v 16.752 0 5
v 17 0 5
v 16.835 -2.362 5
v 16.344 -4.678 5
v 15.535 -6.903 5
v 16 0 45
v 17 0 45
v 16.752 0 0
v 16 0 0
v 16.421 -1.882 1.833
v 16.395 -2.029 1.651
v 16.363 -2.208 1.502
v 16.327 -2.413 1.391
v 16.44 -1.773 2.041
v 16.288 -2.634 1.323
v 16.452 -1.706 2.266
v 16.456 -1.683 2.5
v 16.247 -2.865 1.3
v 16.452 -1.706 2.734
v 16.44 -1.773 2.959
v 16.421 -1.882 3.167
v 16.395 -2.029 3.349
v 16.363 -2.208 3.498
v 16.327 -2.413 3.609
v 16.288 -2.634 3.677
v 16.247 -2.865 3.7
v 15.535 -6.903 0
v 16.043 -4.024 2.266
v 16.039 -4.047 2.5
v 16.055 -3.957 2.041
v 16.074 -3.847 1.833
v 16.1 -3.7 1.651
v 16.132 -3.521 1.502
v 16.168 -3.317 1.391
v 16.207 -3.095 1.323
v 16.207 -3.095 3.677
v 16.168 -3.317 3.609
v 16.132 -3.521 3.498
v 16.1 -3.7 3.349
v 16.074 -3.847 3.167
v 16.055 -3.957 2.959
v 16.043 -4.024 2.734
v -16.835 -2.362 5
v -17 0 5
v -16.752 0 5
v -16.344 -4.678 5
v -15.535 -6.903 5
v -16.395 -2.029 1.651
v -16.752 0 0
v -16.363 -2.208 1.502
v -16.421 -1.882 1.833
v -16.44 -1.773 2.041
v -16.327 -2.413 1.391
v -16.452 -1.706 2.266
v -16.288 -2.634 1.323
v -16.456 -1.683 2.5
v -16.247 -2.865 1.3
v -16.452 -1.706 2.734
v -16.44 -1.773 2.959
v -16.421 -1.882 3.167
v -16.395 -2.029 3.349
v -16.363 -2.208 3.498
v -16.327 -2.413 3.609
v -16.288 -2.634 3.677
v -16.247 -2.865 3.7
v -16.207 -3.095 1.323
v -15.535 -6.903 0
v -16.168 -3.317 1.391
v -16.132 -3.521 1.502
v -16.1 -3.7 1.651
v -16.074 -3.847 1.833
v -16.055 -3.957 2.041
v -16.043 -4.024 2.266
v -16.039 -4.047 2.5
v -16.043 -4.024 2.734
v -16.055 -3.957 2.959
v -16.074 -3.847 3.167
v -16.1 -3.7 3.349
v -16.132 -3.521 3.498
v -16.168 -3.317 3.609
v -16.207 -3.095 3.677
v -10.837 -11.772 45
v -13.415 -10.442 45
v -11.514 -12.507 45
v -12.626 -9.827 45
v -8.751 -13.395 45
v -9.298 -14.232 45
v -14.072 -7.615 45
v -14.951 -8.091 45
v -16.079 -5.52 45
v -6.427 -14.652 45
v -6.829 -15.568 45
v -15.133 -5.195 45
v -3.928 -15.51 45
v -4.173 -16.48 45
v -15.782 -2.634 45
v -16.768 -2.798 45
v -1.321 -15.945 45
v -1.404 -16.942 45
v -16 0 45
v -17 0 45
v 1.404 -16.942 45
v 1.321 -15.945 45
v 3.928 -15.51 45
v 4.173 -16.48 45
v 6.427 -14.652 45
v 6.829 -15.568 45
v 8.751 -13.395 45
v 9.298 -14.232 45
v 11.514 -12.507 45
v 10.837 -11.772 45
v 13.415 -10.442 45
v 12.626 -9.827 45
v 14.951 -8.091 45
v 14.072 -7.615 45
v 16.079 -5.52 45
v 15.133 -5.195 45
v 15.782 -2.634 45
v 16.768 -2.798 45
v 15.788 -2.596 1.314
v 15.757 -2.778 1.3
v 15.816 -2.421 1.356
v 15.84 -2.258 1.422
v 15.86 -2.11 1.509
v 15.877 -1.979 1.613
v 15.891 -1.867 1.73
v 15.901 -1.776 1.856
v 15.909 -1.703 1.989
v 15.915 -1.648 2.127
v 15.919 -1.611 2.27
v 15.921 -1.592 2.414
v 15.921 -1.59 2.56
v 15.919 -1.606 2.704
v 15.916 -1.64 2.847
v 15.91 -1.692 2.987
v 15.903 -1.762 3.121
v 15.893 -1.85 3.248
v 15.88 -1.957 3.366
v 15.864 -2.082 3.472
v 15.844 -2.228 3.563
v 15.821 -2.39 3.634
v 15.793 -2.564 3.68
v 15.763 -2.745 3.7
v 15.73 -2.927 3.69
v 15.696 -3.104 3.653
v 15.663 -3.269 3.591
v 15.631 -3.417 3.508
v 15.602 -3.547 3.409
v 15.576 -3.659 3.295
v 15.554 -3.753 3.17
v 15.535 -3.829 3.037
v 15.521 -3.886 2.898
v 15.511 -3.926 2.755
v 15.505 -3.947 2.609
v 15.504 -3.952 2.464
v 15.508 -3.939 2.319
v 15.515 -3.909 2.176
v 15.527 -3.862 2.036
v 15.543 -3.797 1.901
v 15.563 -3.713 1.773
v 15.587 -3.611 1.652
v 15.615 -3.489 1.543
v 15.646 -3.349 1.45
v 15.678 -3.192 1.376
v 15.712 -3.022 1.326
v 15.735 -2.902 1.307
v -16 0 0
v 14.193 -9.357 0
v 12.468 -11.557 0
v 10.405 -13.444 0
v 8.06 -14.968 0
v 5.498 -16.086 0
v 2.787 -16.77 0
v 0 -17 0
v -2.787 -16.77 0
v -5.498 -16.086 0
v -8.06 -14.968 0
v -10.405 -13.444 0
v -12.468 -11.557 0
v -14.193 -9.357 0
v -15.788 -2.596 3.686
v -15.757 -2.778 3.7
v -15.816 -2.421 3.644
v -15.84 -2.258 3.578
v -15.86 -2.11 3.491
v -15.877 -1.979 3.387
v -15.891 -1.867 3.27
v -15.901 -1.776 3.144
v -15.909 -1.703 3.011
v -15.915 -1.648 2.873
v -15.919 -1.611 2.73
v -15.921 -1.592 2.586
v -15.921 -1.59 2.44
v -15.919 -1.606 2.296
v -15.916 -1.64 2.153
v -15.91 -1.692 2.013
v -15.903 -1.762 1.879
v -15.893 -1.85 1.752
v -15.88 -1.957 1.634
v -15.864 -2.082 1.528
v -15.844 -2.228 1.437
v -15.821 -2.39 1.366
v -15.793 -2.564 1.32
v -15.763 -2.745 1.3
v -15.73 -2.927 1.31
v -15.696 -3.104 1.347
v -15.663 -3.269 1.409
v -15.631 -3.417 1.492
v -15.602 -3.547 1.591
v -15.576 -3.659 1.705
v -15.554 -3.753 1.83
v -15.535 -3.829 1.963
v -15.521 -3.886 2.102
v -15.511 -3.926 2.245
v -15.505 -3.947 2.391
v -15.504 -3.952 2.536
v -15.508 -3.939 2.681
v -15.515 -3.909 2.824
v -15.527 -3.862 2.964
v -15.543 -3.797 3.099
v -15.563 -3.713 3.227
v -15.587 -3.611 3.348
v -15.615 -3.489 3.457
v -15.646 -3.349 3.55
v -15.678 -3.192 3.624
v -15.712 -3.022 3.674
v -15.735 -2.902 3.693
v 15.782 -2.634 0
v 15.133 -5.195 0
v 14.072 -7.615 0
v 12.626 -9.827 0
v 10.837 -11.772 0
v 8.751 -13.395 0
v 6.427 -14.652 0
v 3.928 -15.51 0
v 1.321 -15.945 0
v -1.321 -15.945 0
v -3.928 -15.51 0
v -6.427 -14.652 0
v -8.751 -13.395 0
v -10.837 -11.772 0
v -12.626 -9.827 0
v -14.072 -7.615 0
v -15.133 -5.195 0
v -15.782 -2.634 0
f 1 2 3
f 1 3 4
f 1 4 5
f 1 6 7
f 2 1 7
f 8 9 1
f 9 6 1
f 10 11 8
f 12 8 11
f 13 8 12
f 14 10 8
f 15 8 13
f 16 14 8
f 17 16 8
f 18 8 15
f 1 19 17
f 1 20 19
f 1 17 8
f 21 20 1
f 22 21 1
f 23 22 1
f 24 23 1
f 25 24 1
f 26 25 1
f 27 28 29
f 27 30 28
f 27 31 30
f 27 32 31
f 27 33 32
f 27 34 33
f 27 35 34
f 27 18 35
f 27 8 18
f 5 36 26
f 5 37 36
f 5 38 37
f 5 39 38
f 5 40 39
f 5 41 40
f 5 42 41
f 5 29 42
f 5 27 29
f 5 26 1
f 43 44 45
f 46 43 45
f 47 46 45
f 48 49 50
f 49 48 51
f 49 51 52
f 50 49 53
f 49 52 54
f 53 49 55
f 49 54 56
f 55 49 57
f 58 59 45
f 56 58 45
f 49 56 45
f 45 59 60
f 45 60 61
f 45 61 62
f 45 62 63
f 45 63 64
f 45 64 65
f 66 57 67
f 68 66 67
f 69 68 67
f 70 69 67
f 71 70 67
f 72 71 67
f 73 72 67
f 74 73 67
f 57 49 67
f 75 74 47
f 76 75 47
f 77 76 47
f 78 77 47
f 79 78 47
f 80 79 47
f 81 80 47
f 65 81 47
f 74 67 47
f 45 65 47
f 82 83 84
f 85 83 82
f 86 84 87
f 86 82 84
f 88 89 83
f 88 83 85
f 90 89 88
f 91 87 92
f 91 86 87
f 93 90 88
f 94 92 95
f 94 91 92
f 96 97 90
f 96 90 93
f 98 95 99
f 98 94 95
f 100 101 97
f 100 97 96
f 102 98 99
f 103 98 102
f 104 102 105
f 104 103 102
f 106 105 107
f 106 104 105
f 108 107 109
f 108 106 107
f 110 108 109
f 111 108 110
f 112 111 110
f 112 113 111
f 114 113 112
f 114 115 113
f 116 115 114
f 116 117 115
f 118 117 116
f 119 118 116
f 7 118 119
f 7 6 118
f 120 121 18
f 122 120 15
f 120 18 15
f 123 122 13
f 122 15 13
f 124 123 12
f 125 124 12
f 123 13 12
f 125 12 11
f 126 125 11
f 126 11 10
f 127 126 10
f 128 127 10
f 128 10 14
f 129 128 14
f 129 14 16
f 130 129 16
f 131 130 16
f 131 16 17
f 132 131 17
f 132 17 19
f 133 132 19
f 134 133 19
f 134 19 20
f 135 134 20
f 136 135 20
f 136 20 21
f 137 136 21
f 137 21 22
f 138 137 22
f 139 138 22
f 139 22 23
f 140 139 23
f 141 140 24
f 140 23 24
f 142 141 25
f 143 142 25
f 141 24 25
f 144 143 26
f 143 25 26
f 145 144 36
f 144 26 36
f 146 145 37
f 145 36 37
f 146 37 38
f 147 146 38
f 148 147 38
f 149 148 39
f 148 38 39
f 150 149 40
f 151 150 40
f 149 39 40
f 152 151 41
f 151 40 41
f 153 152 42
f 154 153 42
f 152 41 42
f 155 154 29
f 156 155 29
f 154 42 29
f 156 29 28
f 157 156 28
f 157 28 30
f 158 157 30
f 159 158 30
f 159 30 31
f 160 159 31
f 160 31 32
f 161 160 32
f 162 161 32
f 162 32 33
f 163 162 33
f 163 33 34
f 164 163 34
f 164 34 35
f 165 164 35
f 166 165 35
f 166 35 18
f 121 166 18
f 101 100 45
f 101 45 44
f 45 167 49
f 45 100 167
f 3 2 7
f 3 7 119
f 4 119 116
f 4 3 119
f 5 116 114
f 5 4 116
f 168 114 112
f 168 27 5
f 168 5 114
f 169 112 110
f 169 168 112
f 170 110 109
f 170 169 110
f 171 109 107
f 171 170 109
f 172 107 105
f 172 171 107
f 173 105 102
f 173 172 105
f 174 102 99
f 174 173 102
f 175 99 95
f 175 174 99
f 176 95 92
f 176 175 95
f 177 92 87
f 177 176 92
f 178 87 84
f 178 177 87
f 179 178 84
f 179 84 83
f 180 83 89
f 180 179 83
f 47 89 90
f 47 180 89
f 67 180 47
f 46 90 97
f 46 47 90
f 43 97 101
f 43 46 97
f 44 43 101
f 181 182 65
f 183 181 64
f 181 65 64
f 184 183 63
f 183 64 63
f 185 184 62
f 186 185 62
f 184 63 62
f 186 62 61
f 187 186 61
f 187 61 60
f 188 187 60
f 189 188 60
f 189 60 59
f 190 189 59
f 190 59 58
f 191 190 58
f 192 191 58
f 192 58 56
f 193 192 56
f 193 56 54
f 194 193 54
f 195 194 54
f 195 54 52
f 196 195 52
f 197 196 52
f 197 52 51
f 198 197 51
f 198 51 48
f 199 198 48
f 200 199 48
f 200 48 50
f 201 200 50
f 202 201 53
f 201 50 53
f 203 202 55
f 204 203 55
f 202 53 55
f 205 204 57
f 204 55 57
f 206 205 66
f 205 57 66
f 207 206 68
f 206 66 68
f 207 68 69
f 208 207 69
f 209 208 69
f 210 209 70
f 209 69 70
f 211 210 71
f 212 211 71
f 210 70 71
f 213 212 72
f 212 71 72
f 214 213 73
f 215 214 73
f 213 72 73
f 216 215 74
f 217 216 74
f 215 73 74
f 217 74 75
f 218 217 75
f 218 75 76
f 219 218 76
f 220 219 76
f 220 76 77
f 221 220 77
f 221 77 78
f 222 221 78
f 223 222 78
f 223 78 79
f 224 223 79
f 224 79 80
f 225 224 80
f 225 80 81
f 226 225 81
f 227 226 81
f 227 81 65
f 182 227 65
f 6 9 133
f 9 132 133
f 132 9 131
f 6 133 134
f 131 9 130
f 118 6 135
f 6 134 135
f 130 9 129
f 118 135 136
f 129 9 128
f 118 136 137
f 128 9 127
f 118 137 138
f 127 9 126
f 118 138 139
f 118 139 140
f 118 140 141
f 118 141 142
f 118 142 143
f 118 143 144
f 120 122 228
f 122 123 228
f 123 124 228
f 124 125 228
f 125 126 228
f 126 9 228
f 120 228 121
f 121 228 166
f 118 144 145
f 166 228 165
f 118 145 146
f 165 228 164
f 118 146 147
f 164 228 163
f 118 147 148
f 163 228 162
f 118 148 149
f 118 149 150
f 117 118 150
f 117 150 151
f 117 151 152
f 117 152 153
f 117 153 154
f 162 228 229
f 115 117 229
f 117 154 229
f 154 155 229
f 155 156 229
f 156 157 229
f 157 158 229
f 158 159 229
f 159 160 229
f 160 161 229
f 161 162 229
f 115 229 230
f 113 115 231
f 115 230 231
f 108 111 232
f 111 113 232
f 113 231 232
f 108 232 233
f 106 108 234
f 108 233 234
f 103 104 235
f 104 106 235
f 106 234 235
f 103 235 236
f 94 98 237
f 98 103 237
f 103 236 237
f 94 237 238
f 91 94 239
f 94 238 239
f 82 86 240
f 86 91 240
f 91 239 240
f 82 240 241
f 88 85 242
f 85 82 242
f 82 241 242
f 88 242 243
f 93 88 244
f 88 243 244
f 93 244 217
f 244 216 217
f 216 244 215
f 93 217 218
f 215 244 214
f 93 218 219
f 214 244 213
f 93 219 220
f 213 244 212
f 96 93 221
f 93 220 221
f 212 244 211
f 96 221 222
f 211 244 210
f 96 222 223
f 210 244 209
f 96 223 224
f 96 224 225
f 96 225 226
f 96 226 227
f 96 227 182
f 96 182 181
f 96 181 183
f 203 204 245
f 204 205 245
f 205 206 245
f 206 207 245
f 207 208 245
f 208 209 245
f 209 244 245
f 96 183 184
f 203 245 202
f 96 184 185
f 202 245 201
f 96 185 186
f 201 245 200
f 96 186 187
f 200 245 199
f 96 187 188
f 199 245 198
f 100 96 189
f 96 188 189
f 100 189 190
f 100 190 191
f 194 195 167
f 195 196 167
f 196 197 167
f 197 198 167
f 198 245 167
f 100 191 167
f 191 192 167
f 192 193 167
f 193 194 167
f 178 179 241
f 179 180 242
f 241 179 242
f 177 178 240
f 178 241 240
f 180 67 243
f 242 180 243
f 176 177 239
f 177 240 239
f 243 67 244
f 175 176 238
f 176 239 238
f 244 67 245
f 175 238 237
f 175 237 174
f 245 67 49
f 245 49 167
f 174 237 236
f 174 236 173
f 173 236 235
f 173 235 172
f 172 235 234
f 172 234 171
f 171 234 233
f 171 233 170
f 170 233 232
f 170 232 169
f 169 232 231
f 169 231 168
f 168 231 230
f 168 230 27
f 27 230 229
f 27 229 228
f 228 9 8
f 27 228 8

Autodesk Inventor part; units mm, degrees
ref_plane "XZ Plane" through (0, 0, 0) normal (0, 1, 0) x (-1, 0, 0)
sketch "スケッチ1" plane through (0, 0, 0) normal (0, 0, 1) x (1, 0, 0)
  arc A0 (-17, 0) -> (17, 0) centre (0, 0) ccw
  arc A1 (-16, 0) -> (16, 0) centre (0, 0) ccw
  line L0 (-16, 0) -> (-17, 0)
  line L1 (16, 0) -> (17, 0)
  dimension "d0" = 17
  dimension "d66" = 1
extrude "押し出し1" add sketch "スケッチ1" along normal blind 45
ref_plane "作業平面4" through (16.7417, -2.952, 0) normal (0.9848, -0.1736, 0) x (0, 0, 1)
ref_plane "作業平面3" through (0, 0, 0) normal (0.9848, -0.1736, 0) x (0, 0, 1)
ref_plane "作業平面6" through (-16.7417, -2.952, 0) normal (0.9848, 0.1736, 0) x (0, 0, 1)
ref_plane "作業平面5" through (0, 0, 0) normal (0.9848, 0.1736, 0) x (0, 0, 1)
sketch "スケッチ8" plane through (16.7417, -2.952, 0) normal (0.9848, -0.1736, 0) x (0, 0, 1)
  line L0 (0, -5) -> (5, -5)
  line L1 (5, -5) -> (5, 5)
  line L2 (5, 5) -> (0, 5)
  line L3 (0, 5) -> (0, -5)
  line L4 (0, 0) -> (8.4852, 0) construction
  dimension "d38" = 5
  dimension "d39" = 10
extrude "押し出し8" cut sketch "スケッチ8" against normal blind 0.5
sketch "スケッチ9" plane through (-16.7417, -2.952, 0) normal (0.9848, 0.1736, 0) x (0, 0, 1)
  line L0 (0, -5) -> (5, -5)
  line L1 (5, -5) -> (5, 5)
  line L2 (5, 5) -> (0, 5)
  line L3 (0, 5) -> (0, -5)
  line L4 (0, 0) -> (8.3316, 0) construction
  dimension "d42" = 5
  dimension "d43" = 10
extrude "押し出し9" cut sketch "スケッチ9" along normal blind 0.5
sketch "スケッチ11" plane through (16.2493, -2.8652, 0) normal (0.9848, -0.1736, 0) x (0, 0, -1)
  circle A0 centre (-2.5, 0) radius 1.2
  point P0 (0, 0)
  dimension "d50" = 2.4
  dimension "d51" = 2.5
extrude "押し出し11" cut sketch "スケッチ11" against normal blind 1
sketch "スケッチ12" plane through (-16.2493, -2.8652, 0) normal (-0.9848, -0.1736, 0) x (0, 0, 1)
  circle A0 centre (2.5, 0) radius 1.2
  point P0 (0, 0)
  dimension "d54" = 2.4
  dimension "d55" = 2.5
extrude "押し出し12" cut sketch "スケッチ12" against normal blind 1
properties part number "B_shield_5" material "ステンレス鋼 440C"
